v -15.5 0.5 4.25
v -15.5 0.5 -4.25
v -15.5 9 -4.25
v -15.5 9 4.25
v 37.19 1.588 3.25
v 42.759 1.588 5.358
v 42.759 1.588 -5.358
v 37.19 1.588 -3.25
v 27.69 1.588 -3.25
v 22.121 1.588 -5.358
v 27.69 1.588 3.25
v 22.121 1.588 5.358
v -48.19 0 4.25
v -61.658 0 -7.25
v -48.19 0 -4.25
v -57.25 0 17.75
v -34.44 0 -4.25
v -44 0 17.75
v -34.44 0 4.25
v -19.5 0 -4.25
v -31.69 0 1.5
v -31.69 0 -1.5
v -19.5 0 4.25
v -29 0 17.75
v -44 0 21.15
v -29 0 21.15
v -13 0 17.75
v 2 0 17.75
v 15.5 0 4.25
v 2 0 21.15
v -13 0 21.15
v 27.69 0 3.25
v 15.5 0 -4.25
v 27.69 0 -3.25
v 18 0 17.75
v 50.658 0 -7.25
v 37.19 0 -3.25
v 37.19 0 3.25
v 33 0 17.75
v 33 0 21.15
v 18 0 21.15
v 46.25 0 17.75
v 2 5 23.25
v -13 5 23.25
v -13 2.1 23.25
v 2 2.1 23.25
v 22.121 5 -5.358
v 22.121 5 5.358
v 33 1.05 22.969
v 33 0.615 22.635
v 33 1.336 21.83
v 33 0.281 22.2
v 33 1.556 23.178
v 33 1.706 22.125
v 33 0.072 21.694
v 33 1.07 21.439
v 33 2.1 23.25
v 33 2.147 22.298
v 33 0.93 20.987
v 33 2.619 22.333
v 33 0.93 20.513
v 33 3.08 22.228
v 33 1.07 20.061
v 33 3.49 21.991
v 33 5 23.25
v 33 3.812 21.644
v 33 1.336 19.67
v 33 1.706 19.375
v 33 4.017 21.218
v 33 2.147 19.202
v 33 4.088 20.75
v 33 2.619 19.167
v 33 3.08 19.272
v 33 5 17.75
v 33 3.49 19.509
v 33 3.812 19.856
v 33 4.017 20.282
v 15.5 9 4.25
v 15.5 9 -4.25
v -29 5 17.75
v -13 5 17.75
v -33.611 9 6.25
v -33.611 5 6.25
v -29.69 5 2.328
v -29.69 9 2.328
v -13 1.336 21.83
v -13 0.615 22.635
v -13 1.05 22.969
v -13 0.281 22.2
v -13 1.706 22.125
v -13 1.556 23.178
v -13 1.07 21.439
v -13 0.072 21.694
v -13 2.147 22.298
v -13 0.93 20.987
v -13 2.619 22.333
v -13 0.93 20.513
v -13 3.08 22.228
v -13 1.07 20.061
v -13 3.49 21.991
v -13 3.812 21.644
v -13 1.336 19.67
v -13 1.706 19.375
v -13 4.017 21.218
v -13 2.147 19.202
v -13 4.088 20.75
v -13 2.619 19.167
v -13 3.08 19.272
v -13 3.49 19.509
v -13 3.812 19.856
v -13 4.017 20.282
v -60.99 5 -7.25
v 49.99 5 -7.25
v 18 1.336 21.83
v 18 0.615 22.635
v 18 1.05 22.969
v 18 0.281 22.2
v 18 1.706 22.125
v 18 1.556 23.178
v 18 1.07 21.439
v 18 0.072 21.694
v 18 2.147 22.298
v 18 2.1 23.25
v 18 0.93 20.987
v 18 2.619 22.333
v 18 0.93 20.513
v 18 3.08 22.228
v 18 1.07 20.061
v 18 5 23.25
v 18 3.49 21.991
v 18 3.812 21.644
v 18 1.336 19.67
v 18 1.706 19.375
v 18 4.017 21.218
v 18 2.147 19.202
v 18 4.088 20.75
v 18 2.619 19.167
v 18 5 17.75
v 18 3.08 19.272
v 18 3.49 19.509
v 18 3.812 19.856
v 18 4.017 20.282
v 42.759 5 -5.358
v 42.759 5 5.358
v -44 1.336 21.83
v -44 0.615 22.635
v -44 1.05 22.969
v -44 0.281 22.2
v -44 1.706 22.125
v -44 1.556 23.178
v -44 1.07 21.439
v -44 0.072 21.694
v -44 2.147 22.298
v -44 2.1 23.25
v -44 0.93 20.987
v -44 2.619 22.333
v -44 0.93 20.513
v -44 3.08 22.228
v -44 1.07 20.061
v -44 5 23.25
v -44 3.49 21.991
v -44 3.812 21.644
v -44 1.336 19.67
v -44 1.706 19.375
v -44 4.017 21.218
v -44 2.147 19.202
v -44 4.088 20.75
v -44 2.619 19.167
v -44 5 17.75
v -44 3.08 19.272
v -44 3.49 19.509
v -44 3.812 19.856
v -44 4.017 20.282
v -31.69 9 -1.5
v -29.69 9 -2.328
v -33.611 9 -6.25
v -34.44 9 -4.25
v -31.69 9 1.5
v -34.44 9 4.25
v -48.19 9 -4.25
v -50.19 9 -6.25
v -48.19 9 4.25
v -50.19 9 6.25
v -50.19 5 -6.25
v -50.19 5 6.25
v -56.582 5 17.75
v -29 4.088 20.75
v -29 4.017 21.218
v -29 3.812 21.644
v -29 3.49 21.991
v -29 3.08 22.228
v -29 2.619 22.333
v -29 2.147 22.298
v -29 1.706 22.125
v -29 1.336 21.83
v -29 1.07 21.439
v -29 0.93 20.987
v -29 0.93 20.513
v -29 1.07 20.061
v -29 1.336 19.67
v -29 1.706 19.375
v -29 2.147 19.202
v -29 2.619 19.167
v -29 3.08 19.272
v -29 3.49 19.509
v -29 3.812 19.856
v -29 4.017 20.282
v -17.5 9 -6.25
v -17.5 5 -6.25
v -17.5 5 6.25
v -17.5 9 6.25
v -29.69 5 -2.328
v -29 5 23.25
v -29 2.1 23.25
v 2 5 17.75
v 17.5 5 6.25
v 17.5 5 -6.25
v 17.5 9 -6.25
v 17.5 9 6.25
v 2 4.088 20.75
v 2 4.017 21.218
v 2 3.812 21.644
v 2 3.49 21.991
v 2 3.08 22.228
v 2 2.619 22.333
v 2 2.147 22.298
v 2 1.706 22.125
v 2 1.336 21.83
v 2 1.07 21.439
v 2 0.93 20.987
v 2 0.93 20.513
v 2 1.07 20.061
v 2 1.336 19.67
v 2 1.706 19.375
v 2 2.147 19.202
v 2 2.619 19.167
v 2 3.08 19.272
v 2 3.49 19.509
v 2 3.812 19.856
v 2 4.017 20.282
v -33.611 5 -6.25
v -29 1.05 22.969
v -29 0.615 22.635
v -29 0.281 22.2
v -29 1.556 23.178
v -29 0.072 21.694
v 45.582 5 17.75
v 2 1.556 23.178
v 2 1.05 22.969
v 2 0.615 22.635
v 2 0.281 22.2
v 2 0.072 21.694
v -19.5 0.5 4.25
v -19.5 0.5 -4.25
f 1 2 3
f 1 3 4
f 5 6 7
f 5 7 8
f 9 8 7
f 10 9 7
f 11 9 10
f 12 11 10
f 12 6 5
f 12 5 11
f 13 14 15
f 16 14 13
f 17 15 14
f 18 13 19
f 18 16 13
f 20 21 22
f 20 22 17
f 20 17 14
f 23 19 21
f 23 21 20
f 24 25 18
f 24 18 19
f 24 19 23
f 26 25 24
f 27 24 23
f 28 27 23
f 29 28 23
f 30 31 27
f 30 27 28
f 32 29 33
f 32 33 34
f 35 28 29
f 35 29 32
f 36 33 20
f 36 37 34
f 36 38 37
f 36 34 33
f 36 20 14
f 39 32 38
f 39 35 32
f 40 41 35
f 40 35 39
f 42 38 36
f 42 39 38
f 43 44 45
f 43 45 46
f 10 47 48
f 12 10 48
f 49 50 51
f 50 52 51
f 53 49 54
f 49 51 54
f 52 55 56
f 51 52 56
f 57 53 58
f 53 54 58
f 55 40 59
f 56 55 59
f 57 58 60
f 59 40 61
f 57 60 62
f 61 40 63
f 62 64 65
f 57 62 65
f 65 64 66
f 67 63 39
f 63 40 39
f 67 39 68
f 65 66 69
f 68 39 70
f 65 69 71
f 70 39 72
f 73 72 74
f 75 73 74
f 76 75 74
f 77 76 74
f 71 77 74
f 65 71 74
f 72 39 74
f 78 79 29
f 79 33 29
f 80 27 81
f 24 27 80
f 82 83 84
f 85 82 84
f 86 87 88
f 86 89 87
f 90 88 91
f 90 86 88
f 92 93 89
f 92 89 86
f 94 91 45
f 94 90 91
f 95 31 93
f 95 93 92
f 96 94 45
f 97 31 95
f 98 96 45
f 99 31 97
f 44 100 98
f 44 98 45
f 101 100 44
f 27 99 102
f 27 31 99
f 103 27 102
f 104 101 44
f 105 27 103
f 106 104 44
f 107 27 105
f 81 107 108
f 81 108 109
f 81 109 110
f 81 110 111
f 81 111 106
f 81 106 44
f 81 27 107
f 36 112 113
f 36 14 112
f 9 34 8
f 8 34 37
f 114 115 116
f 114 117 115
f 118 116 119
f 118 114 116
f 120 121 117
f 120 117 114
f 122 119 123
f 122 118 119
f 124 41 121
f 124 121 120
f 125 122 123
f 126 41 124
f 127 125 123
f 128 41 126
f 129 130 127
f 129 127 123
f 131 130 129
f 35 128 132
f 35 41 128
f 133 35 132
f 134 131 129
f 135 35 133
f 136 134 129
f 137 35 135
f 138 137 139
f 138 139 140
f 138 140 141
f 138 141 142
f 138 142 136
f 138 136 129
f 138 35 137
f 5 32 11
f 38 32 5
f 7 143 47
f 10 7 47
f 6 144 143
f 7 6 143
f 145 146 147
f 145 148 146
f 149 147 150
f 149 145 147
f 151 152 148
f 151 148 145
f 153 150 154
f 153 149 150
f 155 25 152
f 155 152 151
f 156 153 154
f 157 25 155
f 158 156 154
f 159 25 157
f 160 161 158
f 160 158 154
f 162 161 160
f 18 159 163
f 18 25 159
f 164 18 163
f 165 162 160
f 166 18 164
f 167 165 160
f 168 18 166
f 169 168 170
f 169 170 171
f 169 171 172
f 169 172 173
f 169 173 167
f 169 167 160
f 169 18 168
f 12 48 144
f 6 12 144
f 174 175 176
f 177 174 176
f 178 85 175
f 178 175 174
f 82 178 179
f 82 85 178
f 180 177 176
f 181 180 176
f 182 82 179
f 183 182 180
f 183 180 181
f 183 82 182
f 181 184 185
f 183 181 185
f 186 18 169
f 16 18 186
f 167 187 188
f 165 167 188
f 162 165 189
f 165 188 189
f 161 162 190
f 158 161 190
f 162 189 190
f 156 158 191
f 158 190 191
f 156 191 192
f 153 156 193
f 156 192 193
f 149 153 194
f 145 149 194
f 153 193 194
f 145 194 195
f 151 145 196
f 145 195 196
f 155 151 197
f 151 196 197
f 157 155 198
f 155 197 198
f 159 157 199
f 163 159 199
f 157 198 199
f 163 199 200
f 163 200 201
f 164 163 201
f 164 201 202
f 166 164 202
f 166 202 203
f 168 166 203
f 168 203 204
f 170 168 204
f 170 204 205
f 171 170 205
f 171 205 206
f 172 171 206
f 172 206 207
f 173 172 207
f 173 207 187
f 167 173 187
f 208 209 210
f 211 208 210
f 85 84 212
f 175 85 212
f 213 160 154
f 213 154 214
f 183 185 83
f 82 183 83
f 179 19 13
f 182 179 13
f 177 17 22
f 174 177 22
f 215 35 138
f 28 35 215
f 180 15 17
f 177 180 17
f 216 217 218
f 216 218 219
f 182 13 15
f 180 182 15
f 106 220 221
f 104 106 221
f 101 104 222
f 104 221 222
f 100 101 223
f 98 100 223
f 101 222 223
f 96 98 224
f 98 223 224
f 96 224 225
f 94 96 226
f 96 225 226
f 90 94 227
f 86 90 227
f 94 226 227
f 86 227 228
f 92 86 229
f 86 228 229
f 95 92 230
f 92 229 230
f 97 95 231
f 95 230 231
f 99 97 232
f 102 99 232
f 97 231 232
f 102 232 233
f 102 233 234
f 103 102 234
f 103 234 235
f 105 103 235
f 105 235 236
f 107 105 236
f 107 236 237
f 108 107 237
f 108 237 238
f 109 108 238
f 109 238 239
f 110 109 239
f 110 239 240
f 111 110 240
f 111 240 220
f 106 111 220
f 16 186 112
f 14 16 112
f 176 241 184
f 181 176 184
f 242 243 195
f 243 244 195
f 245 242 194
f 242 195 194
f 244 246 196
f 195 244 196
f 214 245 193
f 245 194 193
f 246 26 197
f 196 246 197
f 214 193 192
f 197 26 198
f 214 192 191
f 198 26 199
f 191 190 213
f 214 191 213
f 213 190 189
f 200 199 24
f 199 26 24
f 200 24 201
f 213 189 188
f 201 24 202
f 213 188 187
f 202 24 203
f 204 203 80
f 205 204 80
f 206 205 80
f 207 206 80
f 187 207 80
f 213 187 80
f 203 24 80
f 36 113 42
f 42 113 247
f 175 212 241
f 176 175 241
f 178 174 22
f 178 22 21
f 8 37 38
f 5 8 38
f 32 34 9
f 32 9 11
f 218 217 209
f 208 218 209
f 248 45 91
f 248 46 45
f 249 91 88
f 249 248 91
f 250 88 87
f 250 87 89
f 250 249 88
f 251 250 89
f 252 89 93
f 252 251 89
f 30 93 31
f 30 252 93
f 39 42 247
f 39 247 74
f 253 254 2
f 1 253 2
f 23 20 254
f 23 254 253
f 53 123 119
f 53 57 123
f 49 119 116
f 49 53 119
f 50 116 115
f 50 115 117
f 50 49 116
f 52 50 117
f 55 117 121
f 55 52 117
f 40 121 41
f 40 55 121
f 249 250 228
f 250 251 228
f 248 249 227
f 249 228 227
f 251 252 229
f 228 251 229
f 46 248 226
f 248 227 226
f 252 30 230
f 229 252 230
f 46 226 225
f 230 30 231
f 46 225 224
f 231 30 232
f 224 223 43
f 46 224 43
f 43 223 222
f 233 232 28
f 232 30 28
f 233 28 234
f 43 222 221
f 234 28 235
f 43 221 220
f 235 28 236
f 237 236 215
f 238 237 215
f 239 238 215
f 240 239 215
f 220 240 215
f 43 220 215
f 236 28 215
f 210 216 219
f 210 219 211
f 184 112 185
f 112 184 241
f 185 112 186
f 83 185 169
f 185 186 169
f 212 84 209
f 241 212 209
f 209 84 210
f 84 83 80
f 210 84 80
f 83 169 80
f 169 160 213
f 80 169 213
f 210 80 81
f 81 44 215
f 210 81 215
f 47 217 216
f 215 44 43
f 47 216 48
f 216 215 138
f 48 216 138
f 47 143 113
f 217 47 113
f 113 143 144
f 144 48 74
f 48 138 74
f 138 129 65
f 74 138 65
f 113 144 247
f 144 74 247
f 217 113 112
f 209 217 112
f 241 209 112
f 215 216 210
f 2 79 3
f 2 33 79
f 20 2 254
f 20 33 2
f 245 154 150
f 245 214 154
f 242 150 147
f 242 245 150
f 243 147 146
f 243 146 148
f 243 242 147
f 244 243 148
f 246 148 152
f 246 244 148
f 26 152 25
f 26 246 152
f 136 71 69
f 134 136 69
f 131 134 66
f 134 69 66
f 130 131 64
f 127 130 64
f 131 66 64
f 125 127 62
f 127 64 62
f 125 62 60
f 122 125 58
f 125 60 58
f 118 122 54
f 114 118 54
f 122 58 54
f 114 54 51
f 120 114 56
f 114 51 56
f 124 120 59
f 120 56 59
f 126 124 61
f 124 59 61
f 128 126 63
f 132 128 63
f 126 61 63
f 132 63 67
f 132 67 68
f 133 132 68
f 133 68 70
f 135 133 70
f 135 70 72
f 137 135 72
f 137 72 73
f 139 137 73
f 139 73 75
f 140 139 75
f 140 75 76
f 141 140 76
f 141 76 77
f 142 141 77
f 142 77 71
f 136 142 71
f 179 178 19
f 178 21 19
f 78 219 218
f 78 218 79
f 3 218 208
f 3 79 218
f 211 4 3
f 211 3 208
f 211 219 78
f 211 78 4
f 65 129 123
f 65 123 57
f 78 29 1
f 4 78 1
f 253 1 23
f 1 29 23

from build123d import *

# Parameters (mm, degrees)
F0_W       = 31
F0_H       = 8.5
F0_W_2     = 9.5
F0_H_2     = 6.5
F1_DEPTH   = 5
F2_W       = 4
F2_H       = 8.5
F3_DEPTH   = 0.5
F5_DEPTH   = 3.4125
F7_SIZE2   = 0.658252
F7_SIZE    = 4.99999
F7_2_SIZE2 = 0.658252
F7_2_SIZE  = 4.99999
F8_W       = 35
F8_H       = 12.5
F8_W_2     = 31
F8_H_2     = 8.5
F9_DEPTH   = 4
F11_DEPTH  = 4
F12_W      = 15
F12_H      = 5
F13_DEPTH  = 5.5
F14_R      = 1.5875
F15_DEPTH  = 94.6591745177
F16_R      = 2.1


# Not quite as in the source:
# - a fillet or chamfer is up to 0.001 mm smaller than in the source, because OpenCascade refuses the exact size
# - a length typed as a fraction of an inch, garbled in the dataset ("3 / 203.2 mm" for 3/8 in), is restored


with BuildPart() as f1:
    # F0 (on Front) → F1 (new body)
    with BuildSketch(Plane.XZ):
        Polygon((46.25, 17.75), (-57.25, 17.75), (-61.6581745177, -7.25), (50.6581745177, -7.25), align=None)
        Polygon((-48.1899019538, 4.25), (-34.4399019538, 4.25), (-31.6899019538, 1.5), (-31.6899019538, -1.5), (-34.4399019538, -4.25), (-48.1899019538, -4.25), align=None, mode=Mode.SUBTRACT)
        Rectangle(F0_W, F0_H, mode=Mode.SUBTRACT)
        with Locations((32.4399019538, 0)):
            Rectangle(F0_W_2, F0_H_2, mode=Mode.SUBTRACT)
    extrude(amount=-F1_DEPTH)

    # F2 (on face) → F3 (cut)
    with BuildSketch(Plane.XZ):
        with Locations((-17.5, 0)):
            Rectangle(F2_W, F2_H)
    extrude(amount=-F3_DEPTH, mode=Mode.SUBTRACT)

    # F4 (on face) → F5 (cut)
    with BuildSketch(Plane(origin=(0, 5, 0), x_dir=(-1, 0, 0), z_dir=(0, 1, 0))):
        Polygon((-22.1211519538, -5.3578125), (-22.1211519538, 5.3578125), (-42.7586519538, 5.3578125), (-42.7586519538, -5.3578125), align=None)
    extrude(amount=-F5_DEPTH, mode=Mode.SUBTRACT)

    # F7 (size 5 and 0.6582624879 in the source; OpenCascade refuses exactly that, so slightly less here)
    f7_edges = [f1.edges().sort_by_distance(p)[0] for p in [
        (-59.454087, 5, 5.25),
    ]]
    f7_side = f1.faces().sort_by_distance((-59.454087, 2.5, 5.25))[0]
    chamfer(f7_edges, length=F7_SIZE, length2=F7_SIZE2, reference=f7_side)

    # F7#2 (size 5 and 0.6582624879 in the source; OpenCascade refuses exactly that, so slightly less here)
    f7_2_edges = [f1.edges().sort_by_distance(p)[0] for p in [
        (48.454087, 5, 5.25),
    ]]
    f7_2_side = f1.faces().sort_by_distance((48.454087, 2.5, 5.25))[0]
    chamfer(f7_2_edges, length=F7_2_SIZE, length2=F7_2_SIZE2, reference=f7_2_side)

    # F8 (on face) → F9 (join)
    with BuildSketch(Plane(origin=(0, 5, 0), x_dir=(-1, 0, 0), z_dir=(0, 1, 0))):
        Rectangle(F8_W, F8_H)
        Rectangle(F8_W_2, F8_H_2, mode=Mode.SUBTRACT)
    extrude(amount=F9_DEPTH)

    # F10 (on face) → F11 (join)
    with BuildSketch(Plane(origin=(0, 5, 0), x_dir=(-1, 0, 0), z_dir=(0, 1, 0))):
        Polygon((50.1899019538, 6.25), (33.611474829, 6.25), (29.6899019538, 2.3284271247), (29.6899019538, -2.3284271247), (33.611474829, -6.25), (50.1899019538, -6.25), align=None)
        Polygon((31.6899019538, 1.5), (34.4399019538, 4.25), (48.1899019538, 4.25), (48.1899019538, -4.25), (34.4399019538, -4.25), (31.6899019538, -1.5), align=None, mode=Mode.SUBTRACT)
    extrude(amount=F11_DEPTH)

    # F12 (on face) → F13 (join)
    with BuildSketch(Plane.XY.offset(17.75)):
        with Locations((-36.5, 2.5)):
            Rectangle(F12_W, F12_H)
        with Locations((25.5, 2.5)):
            Rectangle(F12_W, F12_H)
        with Locations((-5.5, 2.5)):
            Rectangle(F12_W, F12_H)
    extrude(amount=F13_DEPTH)

    # F14 (on face) → F15 (cut, through all)
    with BuildSketch(Plane.YZ.offset(33)):
        with Locations((2.5, 20.75)):
            Circle(F14_R)
    extrude(amount=-F15_DEPTH, mode=Mode.SUBTRACT)

    # F16
    f16_edges = [f1.edges().sort_by_distance(p)[0] for p in [
        (-36.5, 0, 23.25),
        (-5.5, 0, 23.25),
        (25.5, 0, 23.25),
    ]]
    fillet(f16_edges, radius=F16_R)


solid = f1.part
